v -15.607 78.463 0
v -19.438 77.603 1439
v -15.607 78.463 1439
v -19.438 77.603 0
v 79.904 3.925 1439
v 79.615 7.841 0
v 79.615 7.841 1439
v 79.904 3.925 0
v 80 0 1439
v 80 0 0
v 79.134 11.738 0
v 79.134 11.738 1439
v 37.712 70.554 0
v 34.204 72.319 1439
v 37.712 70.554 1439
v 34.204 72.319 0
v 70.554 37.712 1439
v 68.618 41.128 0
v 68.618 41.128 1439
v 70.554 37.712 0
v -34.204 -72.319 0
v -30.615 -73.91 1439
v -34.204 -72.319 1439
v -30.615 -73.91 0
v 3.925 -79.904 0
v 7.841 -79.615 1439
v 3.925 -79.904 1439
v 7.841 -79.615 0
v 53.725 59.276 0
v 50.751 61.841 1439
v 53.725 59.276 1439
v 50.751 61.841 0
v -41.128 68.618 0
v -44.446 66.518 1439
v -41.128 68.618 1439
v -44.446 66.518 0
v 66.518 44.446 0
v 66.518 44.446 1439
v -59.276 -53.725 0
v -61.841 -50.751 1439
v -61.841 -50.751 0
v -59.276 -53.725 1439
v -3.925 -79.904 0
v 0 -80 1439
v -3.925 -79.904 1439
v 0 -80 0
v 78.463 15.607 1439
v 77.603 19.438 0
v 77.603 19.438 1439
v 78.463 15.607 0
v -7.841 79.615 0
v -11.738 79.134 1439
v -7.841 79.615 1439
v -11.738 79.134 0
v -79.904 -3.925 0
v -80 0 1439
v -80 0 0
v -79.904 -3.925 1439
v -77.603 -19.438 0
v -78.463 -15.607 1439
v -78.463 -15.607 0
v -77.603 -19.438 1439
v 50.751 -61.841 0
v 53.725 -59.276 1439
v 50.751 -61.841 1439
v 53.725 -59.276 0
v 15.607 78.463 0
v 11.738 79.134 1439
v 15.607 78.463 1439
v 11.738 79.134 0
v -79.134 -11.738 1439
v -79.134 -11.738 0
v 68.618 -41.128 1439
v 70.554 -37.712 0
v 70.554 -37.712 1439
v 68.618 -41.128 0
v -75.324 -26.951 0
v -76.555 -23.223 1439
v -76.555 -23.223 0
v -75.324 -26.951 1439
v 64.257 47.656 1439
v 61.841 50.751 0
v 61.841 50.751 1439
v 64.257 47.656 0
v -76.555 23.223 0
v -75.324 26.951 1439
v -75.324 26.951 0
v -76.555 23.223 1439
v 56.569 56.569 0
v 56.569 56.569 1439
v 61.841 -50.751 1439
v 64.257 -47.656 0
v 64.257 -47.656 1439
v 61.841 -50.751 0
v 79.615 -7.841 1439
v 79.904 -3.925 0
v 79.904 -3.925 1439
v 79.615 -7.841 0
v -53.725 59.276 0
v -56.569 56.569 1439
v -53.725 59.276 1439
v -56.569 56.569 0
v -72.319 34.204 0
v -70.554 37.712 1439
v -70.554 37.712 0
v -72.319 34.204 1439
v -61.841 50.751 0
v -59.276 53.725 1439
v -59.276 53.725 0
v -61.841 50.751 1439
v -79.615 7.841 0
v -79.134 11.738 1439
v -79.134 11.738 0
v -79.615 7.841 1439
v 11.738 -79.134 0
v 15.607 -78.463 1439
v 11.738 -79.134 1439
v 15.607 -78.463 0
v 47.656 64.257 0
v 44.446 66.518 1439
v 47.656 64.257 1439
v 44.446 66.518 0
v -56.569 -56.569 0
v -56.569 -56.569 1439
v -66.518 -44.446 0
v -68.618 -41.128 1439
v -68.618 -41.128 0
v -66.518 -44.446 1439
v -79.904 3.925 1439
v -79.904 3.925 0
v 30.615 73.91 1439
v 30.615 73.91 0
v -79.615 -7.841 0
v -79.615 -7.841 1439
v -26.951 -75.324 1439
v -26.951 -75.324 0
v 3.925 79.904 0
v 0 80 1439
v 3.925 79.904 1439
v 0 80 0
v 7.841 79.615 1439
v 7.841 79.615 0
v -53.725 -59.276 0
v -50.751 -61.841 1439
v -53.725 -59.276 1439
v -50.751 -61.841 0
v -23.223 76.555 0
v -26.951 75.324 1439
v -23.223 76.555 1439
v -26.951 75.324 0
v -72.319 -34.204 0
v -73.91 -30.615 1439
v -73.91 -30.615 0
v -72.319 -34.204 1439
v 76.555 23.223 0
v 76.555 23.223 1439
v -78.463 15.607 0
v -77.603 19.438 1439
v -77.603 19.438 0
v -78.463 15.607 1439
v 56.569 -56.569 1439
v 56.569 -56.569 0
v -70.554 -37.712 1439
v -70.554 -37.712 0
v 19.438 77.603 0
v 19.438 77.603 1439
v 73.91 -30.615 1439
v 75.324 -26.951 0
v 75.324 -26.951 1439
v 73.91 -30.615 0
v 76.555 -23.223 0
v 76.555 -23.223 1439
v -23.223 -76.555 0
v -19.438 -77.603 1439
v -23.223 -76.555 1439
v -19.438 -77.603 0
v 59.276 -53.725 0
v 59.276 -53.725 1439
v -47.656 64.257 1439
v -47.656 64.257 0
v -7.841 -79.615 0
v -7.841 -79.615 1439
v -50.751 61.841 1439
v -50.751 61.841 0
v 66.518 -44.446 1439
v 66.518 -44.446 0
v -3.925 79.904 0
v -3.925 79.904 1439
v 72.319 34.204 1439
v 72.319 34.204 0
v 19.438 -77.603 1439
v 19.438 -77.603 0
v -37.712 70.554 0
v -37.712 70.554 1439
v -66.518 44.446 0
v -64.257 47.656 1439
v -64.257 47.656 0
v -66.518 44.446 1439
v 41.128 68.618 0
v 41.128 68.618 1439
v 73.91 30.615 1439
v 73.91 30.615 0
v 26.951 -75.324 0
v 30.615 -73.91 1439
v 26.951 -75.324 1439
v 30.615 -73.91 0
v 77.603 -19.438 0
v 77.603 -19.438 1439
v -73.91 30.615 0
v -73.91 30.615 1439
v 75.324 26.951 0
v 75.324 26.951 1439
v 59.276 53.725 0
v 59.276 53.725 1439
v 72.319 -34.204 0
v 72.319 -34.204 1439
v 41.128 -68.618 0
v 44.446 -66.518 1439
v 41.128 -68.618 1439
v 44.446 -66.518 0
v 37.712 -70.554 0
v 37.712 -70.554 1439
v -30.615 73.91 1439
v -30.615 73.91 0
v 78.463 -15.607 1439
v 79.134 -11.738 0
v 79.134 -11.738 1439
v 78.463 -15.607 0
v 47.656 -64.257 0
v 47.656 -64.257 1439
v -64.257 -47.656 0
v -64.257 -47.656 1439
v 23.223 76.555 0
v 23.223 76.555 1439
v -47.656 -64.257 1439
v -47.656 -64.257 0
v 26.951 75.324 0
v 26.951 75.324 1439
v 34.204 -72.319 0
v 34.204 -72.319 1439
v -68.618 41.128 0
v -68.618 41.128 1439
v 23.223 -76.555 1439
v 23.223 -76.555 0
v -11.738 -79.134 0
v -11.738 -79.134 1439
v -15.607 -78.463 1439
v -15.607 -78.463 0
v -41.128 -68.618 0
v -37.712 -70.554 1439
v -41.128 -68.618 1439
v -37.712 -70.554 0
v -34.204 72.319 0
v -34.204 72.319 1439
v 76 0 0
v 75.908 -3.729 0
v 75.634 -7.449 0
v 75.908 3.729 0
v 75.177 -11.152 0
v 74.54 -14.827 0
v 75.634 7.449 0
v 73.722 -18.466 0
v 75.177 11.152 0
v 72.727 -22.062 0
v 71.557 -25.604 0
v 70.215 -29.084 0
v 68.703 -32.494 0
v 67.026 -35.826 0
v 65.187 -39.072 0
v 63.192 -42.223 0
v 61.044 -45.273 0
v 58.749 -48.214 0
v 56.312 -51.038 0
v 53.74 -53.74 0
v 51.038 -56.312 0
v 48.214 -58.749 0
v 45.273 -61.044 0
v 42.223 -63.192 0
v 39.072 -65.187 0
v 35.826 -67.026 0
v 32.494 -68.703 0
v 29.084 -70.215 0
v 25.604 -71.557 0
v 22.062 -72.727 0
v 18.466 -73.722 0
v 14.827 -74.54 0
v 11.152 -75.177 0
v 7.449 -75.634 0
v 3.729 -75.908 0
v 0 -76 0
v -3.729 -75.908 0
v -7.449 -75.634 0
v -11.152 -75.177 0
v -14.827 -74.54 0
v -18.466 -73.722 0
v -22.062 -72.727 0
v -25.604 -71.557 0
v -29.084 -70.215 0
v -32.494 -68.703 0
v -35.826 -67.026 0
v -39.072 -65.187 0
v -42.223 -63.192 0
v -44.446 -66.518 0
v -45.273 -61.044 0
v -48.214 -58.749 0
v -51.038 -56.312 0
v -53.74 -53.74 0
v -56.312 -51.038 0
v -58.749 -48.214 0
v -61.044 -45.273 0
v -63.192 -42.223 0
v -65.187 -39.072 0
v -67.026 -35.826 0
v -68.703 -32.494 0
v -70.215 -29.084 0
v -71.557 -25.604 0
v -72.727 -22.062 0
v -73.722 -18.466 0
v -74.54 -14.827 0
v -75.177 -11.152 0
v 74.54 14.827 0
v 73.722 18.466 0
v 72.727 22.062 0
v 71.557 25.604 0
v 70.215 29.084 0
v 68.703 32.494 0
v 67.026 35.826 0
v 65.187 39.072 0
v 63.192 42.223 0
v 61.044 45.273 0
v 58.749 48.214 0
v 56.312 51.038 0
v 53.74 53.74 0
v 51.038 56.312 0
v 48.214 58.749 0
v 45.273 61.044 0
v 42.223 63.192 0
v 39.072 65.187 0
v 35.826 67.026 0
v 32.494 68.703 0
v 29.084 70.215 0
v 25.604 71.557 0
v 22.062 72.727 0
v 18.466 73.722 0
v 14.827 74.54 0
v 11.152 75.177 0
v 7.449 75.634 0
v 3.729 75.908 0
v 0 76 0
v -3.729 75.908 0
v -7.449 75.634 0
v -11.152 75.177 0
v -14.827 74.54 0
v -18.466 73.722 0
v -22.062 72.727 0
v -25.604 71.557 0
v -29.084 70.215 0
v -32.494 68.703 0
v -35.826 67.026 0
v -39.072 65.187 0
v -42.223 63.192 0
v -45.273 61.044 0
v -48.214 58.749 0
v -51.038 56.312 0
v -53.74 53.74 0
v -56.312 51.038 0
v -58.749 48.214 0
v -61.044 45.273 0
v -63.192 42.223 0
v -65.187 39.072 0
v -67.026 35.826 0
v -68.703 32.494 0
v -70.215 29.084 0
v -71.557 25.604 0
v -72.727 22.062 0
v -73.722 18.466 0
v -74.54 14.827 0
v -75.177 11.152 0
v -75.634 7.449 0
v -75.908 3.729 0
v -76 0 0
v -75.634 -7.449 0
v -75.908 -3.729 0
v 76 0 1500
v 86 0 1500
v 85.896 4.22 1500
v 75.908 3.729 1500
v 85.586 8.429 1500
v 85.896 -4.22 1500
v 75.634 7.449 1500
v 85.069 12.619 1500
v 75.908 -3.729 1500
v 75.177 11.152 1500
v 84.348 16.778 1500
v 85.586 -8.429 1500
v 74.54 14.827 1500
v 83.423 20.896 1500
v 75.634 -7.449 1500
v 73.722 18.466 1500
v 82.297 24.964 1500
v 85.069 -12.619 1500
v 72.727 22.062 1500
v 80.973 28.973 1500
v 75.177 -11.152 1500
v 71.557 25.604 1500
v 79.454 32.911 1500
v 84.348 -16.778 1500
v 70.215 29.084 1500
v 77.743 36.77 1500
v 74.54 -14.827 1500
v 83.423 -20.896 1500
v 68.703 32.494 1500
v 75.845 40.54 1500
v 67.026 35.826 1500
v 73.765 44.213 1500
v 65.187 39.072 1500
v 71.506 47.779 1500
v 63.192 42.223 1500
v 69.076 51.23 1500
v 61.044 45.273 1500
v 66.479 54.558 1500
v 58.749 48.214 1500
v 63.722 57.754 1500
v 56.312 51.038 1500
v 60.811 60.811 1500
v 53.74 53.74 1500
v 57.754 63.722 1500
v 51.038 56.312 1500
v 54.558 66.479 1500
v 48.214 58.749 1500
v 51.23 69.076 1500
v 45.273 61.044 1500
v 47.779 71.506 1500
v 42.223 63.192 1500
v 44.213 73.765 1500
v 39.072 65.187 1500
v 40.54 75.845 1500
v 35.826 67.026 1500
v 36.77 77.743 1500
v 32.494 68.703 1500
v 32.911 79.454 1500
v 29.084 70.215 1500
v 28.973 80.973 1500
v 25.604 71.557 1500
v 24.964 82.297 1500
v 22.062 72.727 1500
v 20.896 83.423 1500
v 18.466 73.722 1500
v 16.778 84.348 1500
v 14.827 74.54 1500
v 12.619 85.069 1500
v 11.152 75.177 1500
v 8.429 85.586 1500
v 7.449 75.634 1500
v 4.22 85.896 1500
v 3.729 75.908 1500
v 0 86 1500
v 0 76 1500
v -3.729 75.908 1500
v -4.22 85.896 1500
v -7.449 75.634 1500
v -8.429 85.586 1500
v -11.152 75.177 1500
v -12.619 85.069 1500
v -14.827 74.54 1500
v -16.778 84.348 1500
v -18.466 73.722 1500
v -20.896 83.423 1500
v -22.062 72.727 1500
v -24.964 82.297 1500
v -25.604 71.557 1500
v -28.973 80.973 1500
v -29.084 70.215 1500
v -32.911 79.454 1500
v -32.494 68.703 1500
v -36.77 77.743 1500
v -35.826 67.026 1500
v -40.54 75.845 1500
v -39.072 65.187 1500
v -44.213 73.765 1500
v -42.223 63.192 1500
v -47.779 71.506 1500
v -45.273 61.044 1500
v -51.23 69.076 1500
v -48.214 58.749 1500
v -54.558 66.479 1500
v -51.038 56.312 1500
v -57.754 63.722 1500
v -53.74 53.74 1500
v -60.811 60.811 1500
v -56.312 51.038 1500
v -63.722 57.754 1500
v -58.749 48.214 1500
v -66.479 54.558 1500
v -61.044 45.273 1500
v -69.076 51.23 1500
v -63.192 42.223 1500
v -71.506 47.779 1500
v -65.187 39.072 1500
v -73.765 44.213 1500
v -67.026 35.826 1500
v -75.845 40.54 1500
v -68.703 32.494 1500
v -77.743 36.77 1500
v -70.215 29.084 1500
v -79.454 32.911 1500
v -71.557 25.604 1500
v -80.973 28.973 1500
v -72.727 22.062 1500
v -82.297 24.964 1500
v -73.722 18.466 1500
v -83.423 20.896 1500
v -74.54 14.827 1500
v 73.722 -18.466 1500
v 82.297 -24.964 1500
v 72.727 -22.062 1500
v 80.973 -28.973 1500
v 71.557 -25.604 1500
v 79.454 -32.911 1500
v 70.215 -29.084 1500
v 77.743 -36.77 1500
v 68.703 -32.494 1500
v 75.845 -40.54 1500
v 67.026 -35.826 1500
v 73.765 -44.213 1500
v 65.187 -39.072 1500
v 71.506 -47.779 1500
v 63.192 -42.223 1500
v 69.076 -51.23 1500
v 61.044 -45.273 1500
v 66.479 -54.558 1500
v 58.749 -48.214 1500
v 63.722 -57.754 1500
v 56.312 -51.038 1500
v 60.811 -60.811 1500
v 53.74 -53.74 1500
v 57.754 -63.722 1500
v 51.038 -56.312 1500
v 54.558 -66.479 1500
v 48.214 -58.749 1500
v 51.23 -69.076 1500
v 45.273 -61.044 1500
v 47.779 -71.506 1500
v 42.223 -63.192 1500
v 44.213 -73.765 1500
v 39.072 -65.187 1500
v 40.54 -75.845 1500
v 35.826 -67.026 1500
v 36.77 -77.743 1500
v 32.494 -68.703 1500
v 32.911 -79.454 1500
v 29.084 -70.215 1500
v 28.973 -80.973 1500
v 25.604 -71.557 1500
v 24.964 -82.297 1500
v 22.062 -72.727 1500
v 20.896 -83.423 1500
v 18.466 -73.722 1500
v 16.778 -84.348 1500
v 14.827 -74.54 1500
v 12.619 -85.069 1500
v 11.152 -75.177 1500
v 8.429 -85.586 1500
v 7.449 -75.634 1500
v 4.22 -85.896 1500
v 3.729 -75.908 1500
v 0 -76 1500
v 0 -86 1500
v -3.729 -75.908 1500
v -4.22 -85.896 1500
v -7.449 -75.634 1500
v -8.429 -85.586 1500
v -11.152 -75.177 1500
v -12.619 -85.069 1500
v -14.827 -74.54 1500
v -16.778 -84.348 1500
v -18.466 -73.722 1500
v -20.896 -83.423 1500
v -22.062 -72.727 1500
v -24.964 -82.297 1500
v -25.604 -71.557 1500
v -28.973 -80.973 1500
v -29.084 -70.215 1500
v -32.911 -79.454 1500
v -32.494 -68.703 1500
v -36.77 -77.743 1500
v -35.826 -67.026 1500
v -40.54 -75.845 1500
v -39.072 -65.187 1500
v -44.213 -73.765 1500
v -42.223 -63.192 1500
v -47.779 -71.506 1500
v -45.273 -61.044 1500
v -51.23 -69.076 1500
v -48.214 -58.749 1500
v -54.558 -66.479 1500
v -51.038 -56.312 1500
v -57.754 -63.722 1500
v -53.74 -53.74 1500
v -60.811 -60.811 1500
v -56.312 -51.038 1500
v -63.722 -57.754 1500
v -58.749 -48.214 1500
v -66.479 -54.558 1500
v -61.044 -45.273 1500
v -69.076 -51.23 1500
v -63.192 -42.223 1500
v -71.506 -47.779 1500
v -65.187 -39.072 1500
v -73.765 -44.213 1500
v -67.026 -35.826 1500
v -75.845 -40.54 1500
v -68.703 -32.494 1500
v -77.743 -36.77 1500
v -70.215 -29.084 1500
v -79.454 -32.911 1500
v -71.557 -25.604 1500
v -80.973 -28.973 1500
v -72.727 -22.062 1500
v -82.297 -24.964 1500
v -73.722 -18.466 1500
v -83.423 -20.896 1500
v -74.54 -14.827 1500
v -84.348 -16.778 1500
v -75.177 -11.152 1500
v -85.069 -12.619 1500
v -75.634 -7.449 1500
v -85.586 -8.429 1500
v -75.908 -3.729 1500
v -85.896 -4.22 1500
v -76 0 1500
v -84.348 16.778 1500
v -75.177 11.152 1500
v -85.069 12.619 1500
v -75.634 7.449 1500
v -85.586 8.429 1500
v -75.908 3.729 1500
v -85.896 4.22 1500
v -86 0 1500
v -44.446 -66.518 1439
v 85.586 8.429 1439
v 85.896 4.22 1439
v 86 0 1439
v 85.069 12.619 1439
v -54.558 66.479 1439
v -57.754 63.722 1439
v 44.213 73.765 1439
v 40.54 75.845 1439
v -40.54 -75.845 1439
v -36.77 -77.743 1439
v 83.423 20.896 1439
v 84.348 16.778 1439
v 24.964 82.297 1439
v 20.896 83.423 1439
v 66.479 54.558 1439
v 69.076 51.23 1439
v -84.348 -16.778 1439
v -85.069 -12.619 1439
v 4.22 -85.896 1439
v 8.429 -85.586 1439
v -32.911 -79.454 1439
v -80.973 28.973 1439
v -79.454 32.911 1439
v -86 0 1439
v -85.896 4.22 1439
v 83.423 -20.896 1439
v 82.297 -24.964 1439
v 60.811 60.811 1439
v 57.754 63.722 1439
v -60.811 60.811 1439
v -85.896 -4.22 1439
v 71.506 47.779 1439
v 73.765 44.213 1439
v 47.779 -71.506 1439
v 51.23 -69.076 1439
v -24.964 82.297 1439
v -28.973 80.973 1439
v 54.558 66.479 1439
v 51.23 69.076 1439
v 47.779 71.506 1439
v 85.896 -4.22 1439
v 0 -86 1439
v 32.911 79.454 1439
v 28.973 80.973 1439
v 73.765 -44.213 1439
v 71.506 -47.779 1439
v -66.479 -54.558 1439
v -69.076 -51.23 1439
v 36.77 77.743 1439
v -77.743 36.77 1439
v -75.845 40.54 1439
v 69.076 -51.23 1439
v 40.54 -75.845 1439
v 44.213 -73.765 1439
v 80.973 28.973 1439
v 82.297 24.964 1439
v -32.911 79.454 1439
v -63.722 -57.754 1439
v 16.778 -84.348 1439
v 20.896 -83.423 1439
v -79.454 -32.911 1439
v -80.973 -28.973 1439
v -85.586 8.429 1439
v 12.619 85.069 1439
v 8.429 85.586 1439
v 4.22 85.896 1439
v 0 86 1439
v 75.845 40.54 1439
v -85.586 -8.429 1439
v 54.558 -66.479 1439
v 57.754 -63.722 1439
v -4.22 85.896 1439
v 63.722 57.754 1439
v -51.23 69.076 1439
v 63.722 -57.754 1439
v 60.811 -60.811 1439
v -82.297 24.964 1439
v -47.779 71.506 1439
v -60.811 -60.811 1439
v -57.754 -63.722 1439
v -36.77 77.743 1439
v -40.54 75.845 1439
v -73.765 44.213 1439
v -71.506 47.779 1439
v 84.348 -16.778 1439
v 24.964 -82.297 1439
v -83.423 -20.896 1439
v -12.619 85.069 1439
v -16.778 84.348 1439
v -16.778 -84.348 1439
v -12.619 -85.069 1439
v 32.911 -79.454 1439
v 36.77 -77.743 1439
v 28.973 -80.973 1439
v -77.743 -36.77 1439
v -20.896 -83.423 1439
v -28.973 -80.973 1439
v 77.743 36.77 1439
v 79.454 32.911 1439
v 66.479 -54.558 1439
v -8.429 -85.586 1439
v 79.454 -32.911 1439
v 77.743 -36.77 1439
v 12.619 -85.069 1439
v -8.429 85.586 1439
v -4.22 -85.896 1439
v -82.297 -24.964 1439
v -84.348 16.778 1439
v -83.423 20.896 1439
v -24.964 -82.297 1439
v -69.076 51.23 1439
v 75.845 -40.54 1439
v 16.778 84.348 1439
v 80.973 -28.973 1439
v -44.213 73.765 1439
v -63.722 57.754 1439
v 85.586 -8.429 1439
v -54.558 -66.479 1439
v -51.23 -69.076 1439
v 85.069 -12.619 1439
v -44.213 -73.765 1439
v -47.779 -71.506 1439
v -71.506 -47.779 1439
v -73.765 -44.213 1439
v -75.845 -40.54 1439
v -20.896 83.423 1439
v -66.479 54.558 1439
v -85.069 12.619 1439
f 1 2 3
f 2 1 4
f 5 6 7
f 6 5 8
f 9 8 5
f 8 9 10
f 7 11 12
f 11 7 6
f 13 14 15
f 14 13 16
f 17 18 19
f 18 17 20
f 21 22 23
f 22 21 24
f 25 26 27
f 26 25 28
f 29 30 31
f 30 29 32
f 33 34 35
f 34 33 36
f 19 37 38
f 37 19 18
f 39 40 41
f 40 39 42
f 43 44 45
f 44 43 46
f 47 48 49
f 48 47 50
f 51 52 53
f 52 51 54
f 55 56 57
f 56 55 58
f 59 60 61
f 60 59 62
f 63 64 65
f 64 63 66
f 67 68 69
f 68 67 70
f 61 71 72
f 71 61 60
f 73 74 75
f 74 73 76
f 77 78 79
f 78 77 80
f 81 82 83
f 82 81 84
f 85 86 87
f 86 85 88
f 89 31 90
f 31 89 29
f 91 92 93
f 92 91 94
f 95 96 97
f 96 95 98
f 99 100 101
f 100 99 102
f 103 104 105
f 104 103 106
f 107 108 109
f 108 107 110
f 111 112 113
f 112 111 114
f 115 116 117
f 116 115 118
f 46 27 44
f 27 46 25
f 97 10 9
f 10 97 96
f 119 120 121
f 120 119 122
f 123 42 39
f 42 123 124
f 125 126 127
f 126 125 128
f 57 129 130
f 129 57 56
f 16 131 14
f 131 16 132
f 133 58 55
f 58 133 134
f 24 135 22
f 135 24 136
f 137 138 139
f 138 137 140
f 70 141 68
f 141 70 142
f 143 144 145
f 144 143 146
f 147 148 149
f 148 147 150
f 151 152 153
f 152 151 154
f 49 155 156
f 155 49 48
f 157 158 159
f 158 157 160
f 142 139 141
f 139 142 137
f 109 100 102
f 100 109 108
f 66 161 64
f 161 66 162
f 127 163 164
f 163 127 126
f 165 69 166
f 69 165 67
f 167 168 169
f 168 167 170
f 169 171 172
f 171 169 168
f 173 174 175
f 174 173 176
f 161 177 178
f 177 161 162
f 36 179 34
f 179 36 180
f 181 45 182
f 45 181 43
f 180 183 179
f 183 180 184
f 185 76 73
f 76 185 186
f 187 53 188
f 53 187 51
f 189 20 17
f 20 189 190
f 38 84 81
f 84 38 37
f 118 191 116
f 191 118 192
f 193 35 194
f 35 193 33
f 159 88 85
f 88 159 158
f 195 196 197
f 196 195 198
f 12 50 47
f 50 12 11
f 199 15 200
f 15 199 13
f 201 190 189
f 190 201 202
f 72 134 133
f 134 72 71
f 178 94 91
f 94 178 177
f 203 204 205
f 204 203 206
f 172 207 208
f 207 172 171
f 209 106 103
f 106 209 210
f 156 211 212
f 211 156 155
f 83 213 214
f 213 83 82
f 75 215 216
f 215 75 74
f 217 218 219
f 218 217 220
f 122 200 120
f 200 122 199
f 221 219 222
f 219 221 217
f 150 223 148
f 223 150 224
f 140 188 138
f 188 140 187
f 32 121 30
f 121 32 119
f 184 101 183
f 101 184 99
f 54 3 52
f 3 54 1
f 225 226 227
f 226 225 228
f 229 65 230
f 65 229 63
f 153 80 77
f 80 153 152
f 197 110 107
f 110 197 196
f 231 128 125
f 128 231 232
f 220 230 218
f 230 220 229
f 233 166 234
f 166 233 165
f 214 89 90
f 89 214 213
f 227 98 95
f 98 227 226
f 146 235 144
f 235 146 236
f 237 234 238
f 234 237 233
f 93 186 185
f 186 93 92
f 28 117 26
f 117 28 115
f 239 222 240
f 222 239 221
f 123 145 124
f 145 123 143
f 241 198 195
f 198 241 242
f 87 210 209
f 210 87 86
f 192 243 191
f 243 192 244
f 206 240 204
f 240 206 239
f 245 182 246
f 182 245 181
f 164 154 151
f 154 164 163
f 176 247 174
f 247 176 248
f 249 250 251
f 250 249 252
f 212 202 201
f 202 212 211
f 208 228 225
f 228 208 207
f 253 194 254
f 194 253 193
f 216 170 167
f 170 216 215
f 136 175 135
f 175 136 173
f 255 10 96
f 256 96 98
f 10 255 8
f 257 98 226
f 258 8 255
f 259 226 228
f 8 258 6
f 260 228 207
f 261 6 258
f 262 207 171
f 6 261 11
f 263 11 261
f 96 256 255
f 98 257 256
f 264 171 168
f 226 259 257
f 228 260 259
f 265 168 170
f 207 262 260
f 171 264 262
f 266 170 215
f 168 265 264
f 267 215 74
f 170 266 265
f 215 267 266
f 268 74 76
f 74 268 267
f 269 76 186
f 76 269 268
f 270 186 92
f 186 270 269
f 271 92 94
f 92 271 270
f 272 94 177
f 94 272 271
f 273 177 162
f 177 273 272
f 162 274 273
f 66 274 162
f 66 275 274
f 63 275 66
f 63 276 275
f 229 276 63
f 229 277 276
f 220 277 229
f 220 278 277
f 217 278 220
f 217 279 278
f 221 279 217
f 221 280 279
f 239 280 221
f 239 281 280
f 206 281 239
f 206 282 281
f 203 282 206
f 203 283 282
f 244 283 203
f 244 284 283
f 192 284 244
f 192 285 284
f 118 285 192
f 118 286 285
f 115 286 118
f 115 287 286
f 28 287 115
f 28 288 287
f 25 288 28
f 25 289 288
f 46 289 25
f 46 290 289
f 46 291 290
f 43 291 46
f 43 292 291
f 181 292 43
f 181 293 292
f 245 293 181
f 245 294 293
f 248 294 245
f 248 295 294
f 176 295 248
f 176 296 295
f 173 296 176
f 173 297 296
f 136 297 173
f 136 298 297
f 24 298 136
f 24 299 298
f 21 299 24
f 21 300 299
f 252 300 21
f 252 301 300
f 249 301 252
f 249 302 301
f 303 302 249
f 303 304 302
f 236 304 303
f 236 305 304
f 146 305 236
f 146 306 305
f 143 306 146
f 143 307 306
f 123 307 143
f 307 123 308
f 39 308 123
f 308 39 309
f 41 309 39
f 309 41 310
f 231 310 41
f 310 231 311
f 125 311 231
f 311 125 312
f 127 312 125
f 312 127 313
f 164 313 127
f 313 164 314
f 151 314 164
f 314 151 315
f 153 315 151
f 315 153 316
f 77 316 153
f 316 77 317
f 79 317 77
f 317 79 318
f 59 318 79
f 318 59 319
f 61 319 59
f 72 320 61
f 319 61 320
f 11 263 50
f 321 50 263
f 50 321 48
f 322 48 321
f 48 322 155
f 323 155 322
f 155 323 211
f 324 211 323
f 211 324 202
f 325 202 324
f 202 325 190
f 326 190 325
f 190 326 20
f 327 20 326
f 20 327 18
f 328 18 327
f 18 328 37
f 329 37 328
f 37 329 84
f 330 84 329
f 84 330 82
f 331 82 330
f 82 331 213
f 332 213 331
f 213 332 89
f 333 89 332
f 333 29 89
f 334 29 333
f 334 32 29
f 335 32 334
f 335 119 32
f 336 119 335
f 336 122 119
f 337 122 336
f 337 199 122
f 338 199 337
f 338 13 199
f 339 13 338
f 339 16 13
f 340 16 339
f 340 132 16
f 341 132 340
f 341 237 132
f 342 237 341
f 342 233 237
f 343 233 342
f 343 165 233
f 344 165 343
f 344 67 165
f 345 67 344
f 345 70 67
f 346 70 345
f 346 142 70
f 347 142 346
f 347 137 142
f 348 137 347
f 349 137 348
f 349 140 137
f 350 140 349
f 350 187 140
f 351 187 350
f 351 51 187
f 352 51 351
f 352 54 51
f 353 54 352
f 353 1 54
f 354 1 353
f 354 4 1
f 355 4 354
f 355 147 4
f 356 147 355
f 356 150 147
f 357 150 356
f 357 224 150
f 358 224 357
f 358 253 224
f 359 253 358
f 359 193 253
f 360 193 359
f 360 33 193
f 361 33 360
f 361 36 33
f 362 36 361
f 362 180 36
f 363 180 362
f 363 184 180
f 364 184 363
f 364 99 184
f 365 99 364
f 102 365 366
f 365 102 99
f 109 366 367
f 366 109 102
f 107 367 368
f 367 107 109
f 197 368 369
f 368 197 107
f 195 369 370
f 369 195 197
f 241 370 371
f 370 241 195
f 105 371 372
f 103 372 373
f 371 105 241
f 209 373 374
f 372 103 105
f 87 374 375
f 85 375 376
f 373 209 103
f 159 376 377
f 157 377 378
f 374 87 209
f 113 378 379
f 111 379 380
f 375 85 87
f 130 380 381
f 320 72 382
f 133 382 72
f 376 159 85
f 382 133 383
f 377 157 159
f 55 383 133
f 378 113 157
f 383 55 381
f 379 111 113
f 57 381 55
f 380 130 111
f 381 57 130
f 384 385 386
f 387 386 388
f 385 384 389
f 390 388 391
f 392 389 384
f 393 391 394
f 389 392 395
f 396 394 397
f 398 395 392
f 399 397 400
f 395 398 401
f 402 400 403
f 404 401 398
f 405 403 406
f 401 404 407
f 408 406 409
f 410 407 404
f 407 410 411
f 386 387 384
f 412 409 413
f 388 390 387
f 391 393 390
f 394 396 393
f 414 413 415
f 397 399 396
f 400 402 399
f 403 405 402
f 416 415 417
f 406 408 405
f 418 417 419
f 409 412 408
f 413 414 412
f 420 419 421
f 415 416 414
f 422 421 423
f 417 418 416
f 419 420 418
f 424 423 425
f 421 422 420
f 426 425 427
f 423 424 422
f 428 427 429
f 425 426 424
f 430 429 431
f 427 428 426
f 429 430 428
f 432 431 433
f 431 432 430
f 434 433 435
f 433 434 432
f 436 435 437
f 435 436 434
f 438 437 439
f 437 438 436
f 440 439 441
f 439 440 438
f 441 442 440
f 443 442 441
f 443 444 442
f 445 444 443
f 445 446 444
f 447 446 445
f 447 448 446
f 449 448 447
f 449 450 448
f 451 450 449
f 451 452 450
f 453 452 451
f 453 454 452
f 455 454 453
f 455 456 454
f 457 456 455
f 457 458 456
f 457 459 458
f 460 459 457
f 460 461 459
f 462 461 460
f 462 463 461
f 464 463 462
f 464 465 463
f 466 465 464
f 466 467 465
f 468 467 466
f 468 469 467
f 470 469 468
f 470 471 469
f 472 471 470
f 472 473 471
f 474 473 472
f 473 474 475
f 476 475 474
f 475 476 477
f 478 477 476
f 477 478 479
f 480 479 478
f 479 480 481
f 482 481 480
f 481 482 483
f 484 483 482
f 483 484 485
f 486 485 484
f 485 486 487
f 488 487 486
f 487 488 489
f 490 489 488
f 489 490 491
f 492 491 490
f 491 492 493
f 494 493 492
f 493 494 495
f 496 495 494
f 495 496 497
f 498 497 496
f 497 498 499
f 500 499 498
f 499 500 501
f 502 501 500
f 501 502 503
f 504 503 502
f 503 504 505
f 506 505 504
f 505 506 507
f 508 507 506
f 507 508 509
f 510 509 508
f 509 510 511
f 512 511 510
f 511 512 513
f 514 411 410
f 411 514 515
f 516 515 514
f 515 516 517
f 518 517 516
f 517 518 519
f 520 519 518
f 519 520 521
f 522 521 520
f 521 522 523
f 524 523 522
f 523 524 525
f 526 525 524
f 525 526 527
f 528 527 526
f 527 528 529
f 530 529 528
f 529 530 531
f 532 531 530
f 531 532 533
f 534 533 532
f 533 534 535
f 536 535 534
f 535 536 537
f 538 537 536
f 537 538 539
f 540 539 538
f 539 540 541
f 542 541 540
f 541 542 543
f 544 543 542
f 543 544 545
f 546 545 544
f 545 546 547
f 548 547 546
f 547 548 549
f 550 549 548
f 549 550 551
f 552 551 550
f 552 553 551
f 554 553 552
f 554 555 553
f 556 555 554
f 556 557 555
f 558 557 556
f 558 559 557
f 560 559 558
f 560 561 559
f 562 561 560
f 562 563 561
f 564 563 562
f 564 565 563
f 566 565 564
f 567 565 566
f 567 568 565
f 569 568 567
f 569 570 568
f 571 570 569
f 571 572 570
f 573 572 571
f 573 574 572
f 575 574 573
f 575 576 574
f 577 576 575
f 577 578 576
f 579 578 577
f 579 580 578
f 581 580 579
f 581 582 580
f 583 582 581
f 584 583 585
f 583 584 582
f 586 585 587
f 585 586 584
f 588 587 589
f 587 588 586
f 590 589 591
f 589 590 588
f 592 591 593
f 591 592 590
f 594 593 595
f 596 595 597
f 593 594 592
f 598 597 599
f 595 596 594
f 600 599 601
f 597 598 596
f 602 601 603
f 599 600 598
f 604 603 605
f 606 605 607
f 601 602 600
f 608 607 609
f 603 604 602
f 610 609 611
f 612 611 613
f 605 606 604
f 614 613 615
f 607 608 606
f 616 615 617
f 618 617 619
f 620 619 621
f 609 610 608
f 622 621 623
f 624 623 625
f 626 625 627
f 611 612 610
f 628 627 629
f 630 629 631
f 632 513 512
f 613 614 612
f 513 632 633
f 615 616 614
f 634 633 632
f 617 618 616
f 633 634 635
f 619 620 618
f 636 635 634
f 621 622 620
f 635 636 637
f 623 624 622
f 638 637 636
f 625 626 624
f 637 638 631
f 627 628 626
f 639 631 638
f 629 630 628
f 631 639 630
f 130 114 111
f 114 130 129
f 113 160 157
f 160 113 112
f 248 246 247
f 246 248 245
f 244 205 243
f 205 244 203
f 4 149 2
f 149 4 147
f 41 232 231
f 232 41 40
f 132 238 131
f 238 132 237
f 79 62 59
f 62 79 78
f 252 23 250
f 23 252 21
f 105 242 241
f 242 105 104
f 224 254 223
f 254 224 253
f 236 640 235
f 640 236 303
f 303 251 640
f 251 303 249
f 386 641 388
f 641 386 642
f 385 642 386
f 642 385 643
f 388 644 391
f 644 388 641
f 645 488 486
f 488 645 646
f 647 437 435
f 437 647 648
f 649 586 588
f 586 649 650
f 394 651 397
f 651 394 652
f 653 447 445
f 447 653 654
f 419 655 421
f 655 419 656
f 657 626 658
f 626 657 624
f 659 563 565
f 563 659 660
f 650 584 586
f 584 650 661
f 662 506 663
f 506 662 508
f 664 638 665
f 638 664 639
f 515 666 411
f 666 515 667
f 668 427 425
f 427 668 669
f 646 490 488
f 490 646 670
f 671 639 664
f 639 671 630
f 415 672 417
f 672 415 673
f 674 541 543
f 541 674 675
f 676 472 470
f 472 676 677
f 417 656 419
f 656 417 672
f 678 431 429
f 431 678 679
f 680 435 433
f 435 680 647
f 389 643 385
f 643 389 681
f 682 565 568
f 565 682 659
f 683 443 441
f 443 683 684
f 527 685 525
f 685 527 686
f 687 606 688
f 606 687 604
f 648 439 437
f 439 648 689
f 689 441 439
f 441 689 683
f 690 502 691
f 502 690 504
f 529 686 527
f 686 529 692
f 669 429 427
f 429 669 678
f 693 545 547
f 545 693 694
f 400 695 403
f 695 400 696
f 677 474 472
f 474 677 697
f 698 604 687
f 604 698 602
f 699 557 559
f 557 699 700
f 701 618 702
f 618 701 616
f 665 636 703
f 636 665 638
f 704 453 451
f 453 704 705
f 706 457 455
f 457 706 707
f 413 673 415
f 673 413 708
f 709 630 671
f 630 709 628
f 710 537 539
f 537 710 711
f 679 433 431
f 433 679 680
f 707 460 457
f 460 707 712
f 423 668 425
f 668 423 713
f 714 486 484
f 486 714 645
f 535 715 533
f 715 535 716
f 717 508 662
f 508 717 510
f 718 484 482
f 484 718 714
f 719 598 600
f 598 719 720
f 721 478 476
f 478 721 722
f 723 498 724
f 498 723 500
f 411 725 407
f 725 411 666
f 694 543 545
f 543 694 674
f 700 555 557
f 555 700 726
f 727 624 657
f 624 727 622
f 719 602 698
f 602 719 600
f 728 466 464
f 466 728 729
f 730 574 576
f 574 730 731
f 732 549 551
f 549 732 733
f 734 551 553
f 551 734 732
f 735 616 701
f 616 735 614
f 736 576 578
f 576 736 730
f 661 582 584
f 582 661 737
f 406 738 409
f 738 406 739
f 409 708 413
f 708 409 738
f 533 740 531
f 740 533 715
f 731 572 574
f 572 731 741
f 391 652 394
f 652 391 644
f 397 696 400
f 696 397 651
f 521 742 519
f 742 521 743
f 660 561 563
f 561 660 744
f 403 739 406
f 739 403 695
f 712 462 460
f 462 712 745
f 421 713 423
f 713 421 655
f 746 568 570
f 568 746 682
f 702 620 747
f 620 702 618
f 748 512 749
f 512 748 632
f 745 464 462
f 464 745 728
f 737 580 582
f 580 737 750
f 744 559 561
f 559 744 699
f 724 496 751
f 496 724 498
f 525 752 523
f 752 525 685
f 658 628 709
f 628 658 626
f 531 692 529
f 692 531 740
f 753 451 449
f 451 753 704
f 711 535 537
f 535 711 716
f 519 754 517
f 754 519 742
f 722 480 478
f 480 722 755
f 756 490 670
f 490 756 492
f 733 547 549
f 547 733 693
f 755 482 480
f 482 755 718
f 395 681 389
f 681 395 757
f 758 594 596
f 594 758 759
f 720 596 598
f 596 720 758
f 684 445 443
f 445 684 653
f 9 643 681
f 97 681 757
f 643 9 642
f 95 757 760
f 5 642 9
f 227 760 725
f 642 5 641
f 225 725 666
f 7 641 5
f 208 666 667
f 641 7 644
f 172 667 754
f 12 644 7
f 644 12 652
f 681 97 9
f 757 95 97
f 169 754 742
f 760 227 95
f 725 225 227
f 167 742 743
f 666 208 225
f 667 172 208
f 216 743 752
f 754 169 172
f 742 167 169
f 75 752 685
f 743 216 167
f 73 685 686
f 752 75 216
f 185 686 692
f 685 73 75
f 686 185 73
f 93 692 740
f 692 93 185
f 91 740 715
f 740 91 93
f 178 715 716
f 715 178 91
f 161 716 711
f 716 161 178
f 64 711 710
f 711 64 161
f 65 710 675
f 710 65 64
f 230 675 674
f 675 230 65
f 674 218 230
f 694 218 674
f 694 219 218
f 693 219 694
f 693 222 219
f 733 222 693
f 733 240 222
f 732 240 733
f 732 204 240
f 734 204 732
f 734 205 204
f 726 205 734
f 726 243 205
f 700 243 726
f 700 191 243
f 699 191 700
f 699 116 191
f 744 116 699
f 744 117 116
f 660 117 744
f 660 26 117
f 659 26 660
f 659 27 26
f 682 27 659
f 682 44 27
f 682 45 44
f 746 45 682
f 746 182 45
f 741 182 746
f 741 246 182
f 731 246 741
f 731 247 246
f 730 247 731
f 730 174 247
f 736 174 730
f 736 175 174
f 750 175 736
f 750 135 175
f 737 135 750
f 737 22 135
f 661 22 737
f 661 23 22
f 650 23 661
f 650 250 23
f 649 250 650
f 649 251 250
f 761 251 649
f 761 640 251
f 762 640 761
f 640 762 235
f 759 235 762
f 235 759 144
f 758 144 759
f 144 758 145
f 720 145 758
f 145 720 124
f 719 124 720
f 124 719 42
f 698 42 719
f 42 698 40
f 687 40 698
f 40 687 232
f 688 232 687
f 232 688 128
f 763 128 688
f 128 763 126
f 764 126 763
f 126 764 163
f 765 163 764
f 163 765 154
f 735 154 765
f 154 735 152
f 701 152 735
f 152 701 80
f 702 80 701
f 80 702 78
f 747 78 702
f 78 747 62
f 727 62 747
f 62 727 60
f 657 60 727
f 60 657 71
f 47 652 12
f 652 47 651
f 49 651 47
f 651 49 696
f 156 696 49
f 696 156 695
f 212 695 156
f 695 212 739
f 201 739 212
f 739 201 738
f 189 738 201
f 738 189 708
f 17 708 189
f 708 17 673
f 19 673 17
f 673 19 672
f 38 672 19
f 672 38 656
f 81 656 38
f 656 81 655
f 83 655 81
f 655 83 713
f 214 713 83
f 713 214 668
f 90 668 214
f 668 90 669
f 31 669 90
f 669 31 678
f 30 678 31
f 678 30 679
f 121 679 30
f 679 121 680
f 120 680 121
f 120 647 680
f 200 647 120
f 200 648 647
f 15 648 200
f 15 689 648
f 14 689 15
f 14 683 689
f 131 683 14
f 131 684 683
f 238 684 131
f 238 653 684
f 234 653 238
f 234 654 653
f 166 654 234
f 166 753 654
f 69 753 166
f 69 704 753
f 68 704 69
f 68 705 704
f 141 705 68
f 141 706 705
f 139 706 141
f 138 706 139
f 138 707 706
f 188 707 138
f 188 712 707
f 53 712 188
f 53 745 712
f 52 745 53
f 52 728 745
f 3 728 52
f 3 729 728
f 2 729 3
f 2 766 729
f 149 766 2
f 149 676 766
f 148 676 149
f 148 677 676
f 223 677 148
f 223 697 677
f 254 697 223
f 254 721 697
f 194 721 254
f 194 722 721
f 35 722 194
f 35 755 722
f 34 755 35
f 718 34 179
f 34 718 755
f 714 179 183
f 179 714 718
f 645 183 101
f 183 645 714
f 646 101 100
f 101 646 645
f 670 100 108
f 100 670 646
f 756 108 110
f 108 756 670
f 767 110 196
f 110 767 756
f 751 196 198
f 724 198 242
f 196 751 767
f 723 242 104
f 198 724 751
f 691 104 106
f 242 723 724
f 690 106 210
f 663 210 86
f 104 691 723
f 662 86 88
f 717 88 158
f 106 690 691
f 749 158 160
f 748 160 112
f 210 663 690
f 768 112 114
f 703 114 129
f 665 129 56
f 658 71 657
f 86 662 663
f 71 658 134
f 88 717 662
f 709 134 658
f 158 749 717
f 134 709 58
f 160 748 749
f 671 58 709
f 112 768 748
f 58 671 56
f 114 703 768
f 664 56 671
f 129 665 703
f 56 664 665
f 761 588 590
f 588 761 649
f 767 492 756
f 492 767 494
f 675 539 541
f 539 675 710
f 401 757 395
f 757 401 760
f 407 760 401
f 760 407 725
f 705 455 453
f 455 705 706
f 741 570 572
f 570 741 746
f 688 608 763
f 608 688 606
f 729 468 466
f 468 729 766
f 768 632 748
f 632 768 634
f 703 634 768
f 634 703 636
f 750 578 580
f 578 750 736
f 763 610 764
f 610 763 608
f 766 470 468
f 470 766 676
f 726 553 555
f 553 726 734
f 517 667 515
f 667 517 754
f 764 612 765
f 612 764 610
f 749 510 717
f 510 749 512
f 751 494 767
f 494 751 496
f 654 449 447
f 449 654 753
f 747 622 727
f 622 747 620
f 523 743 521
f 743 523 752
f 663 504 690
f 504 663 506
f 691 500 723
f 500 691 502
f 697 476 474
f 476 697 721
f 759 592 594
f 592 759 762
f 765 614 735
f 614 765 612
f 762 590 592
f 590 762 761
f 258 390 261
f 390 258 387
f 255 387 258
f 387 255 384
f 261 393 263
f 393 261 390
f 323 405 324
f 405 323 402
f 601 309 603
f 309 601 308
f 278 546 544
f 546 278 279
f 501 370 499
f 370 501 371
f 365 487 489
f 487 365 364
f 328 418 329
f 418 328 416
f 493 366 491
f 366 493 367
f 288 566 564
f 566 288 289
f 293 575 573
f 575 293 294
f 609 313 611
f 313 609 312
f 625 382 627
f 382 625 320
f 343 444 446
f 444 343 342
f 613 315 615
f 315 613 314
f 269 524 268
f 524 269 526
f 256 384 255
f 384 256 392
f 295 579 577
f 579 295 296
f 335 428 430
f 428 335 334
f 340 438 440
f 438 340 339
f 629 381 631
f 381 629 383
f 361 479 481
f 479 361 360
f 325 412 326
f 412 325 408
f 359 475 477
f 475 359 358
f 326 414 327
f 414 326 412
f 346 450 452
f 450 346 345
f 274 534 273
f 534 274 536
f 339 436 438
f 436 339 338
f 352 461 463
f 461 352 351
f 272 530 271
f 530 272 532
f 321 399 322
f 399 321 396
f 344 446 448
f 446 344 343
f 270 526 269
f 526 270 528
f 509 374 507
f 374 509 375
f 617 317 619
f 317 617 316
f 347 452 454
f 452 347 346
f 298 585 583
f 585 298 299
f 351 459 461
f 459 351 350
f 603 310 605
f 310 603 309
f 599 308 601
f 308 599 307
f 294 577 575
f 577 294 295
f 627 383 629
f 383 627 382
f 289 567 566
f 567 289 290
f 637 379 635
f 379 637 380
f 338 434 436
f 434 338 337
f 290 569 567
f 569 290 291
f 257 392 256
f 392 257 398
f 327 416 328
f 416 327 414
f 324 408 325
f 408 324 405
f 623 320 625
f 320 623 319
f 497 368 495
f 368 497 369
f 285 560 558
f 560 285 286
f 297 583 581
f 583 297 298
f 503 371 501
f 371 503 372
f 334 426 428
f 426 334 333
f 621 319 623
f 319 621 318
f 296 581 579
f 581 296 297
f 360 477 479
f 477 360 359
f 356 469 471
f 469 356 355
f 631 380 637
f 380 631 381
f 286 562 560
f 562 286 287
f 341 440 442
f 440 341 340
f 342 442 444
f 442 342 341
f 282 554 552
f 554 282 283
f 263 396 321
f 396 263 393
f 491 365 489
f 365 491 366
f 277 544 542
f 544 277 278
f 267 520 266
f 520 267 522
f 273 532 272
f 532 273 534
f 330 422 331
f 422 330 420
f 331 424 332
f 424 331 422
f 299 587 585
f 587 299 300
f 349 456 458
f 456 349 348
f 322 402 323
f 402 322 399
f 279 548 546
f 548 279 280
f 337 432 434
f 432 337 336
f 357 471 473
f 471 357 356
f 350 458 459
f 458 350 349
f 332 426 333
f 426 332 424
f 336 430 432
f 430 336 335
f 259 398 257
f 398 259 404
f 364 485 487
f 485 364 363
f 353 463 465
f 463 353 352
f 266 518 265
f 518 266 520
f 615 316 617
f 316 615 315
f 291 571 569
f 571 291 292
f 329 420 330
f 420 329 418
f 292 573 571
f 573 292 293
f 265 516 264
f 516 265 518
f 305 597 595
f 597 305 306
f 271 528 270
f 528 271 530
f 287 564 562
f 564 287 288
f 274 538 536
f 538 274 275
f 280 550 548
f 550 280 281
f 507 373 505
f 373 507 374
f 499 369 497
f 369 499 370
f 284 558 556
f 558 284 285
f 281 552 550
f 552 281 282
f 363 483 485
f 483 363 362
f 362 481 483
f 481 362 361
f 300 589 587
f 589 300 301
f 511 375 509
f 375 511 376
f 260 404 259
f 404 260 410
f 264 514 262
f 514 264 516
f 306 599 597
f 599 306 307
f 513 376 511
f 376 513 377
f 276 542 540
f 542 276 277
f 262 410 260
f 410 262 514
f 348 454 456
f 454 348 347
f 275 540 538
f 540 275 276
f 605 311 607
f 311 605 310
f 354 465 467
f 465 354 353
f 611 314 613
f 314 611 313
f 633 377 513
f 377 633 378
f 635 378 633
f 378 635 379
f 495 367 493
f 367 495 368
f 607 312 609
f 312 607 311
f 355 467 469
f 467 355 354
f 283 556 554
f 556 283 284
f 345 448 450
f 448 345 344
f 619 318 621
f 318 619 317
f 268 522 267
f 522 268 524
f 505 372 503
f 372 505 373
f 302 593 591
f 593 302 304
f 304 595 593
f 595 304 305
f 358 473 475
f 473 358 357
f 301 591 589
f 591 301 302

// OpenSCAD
// Parameters
nominal_diameter_mm = 160; //[80:320:1]
length_mm = 1500; //[750:3000:1]
pipe_wall_thickness = 4; //[2:8:0.5]
end_fitting_length = 60; //[30:120:1]
end_fitting_radial_add = 6; //[3:12:0.5]
end_fitting_overlap = 1; //[0.5:2:0.5]
inner_void_extra_height = 2; //[1:5:0.5]

$fn = 128;

module ht_pipe() {
  outer_r = nominal_diameter_mm/2;
  inner_r = outer_r - pipe_wall_thickness;

  // Safety to avoid invalid/empty geometry
  inner_r_safe = max(0.01, inner_r);
  overlap_safe = max(0.01, end_fitting_overlap);
  extra_h = max(0.01, inner_void_extra_height);

  // Socket starts so it overlaps into the main pipe by overlap_safe
  fitting_z0 = length_mm - end_fitting_length - overlap_safe;

  // Keep socket within the pipe length (still overlapping)
  fitting_z0_clamped = min(max(0, fitting_z0), length_mm - overlap_safe);

  color([0.85, 0.85, 0.8])
  difference() {
    // OUTER SOLID: main OD + socket OD, connected via overlap
    union() {
      cylinder(h=length_mm, r=outer_r, center=false);

      translate([0, 0, fitting_z0_clamped])
        cylinder(h=end_fitting_length + overlap_safe, r=outer_r + end_fitting_radial_add, center=false);
    }

    // INNER VOID: continuous through entire length, extended to avoid coplanar artifacts
    translate([0, 0, -extra_h])
      cylinder(h=length_mm + 2*extra_h, r=inner_r_safe, center=false);
  }
}

ht_pipe();
